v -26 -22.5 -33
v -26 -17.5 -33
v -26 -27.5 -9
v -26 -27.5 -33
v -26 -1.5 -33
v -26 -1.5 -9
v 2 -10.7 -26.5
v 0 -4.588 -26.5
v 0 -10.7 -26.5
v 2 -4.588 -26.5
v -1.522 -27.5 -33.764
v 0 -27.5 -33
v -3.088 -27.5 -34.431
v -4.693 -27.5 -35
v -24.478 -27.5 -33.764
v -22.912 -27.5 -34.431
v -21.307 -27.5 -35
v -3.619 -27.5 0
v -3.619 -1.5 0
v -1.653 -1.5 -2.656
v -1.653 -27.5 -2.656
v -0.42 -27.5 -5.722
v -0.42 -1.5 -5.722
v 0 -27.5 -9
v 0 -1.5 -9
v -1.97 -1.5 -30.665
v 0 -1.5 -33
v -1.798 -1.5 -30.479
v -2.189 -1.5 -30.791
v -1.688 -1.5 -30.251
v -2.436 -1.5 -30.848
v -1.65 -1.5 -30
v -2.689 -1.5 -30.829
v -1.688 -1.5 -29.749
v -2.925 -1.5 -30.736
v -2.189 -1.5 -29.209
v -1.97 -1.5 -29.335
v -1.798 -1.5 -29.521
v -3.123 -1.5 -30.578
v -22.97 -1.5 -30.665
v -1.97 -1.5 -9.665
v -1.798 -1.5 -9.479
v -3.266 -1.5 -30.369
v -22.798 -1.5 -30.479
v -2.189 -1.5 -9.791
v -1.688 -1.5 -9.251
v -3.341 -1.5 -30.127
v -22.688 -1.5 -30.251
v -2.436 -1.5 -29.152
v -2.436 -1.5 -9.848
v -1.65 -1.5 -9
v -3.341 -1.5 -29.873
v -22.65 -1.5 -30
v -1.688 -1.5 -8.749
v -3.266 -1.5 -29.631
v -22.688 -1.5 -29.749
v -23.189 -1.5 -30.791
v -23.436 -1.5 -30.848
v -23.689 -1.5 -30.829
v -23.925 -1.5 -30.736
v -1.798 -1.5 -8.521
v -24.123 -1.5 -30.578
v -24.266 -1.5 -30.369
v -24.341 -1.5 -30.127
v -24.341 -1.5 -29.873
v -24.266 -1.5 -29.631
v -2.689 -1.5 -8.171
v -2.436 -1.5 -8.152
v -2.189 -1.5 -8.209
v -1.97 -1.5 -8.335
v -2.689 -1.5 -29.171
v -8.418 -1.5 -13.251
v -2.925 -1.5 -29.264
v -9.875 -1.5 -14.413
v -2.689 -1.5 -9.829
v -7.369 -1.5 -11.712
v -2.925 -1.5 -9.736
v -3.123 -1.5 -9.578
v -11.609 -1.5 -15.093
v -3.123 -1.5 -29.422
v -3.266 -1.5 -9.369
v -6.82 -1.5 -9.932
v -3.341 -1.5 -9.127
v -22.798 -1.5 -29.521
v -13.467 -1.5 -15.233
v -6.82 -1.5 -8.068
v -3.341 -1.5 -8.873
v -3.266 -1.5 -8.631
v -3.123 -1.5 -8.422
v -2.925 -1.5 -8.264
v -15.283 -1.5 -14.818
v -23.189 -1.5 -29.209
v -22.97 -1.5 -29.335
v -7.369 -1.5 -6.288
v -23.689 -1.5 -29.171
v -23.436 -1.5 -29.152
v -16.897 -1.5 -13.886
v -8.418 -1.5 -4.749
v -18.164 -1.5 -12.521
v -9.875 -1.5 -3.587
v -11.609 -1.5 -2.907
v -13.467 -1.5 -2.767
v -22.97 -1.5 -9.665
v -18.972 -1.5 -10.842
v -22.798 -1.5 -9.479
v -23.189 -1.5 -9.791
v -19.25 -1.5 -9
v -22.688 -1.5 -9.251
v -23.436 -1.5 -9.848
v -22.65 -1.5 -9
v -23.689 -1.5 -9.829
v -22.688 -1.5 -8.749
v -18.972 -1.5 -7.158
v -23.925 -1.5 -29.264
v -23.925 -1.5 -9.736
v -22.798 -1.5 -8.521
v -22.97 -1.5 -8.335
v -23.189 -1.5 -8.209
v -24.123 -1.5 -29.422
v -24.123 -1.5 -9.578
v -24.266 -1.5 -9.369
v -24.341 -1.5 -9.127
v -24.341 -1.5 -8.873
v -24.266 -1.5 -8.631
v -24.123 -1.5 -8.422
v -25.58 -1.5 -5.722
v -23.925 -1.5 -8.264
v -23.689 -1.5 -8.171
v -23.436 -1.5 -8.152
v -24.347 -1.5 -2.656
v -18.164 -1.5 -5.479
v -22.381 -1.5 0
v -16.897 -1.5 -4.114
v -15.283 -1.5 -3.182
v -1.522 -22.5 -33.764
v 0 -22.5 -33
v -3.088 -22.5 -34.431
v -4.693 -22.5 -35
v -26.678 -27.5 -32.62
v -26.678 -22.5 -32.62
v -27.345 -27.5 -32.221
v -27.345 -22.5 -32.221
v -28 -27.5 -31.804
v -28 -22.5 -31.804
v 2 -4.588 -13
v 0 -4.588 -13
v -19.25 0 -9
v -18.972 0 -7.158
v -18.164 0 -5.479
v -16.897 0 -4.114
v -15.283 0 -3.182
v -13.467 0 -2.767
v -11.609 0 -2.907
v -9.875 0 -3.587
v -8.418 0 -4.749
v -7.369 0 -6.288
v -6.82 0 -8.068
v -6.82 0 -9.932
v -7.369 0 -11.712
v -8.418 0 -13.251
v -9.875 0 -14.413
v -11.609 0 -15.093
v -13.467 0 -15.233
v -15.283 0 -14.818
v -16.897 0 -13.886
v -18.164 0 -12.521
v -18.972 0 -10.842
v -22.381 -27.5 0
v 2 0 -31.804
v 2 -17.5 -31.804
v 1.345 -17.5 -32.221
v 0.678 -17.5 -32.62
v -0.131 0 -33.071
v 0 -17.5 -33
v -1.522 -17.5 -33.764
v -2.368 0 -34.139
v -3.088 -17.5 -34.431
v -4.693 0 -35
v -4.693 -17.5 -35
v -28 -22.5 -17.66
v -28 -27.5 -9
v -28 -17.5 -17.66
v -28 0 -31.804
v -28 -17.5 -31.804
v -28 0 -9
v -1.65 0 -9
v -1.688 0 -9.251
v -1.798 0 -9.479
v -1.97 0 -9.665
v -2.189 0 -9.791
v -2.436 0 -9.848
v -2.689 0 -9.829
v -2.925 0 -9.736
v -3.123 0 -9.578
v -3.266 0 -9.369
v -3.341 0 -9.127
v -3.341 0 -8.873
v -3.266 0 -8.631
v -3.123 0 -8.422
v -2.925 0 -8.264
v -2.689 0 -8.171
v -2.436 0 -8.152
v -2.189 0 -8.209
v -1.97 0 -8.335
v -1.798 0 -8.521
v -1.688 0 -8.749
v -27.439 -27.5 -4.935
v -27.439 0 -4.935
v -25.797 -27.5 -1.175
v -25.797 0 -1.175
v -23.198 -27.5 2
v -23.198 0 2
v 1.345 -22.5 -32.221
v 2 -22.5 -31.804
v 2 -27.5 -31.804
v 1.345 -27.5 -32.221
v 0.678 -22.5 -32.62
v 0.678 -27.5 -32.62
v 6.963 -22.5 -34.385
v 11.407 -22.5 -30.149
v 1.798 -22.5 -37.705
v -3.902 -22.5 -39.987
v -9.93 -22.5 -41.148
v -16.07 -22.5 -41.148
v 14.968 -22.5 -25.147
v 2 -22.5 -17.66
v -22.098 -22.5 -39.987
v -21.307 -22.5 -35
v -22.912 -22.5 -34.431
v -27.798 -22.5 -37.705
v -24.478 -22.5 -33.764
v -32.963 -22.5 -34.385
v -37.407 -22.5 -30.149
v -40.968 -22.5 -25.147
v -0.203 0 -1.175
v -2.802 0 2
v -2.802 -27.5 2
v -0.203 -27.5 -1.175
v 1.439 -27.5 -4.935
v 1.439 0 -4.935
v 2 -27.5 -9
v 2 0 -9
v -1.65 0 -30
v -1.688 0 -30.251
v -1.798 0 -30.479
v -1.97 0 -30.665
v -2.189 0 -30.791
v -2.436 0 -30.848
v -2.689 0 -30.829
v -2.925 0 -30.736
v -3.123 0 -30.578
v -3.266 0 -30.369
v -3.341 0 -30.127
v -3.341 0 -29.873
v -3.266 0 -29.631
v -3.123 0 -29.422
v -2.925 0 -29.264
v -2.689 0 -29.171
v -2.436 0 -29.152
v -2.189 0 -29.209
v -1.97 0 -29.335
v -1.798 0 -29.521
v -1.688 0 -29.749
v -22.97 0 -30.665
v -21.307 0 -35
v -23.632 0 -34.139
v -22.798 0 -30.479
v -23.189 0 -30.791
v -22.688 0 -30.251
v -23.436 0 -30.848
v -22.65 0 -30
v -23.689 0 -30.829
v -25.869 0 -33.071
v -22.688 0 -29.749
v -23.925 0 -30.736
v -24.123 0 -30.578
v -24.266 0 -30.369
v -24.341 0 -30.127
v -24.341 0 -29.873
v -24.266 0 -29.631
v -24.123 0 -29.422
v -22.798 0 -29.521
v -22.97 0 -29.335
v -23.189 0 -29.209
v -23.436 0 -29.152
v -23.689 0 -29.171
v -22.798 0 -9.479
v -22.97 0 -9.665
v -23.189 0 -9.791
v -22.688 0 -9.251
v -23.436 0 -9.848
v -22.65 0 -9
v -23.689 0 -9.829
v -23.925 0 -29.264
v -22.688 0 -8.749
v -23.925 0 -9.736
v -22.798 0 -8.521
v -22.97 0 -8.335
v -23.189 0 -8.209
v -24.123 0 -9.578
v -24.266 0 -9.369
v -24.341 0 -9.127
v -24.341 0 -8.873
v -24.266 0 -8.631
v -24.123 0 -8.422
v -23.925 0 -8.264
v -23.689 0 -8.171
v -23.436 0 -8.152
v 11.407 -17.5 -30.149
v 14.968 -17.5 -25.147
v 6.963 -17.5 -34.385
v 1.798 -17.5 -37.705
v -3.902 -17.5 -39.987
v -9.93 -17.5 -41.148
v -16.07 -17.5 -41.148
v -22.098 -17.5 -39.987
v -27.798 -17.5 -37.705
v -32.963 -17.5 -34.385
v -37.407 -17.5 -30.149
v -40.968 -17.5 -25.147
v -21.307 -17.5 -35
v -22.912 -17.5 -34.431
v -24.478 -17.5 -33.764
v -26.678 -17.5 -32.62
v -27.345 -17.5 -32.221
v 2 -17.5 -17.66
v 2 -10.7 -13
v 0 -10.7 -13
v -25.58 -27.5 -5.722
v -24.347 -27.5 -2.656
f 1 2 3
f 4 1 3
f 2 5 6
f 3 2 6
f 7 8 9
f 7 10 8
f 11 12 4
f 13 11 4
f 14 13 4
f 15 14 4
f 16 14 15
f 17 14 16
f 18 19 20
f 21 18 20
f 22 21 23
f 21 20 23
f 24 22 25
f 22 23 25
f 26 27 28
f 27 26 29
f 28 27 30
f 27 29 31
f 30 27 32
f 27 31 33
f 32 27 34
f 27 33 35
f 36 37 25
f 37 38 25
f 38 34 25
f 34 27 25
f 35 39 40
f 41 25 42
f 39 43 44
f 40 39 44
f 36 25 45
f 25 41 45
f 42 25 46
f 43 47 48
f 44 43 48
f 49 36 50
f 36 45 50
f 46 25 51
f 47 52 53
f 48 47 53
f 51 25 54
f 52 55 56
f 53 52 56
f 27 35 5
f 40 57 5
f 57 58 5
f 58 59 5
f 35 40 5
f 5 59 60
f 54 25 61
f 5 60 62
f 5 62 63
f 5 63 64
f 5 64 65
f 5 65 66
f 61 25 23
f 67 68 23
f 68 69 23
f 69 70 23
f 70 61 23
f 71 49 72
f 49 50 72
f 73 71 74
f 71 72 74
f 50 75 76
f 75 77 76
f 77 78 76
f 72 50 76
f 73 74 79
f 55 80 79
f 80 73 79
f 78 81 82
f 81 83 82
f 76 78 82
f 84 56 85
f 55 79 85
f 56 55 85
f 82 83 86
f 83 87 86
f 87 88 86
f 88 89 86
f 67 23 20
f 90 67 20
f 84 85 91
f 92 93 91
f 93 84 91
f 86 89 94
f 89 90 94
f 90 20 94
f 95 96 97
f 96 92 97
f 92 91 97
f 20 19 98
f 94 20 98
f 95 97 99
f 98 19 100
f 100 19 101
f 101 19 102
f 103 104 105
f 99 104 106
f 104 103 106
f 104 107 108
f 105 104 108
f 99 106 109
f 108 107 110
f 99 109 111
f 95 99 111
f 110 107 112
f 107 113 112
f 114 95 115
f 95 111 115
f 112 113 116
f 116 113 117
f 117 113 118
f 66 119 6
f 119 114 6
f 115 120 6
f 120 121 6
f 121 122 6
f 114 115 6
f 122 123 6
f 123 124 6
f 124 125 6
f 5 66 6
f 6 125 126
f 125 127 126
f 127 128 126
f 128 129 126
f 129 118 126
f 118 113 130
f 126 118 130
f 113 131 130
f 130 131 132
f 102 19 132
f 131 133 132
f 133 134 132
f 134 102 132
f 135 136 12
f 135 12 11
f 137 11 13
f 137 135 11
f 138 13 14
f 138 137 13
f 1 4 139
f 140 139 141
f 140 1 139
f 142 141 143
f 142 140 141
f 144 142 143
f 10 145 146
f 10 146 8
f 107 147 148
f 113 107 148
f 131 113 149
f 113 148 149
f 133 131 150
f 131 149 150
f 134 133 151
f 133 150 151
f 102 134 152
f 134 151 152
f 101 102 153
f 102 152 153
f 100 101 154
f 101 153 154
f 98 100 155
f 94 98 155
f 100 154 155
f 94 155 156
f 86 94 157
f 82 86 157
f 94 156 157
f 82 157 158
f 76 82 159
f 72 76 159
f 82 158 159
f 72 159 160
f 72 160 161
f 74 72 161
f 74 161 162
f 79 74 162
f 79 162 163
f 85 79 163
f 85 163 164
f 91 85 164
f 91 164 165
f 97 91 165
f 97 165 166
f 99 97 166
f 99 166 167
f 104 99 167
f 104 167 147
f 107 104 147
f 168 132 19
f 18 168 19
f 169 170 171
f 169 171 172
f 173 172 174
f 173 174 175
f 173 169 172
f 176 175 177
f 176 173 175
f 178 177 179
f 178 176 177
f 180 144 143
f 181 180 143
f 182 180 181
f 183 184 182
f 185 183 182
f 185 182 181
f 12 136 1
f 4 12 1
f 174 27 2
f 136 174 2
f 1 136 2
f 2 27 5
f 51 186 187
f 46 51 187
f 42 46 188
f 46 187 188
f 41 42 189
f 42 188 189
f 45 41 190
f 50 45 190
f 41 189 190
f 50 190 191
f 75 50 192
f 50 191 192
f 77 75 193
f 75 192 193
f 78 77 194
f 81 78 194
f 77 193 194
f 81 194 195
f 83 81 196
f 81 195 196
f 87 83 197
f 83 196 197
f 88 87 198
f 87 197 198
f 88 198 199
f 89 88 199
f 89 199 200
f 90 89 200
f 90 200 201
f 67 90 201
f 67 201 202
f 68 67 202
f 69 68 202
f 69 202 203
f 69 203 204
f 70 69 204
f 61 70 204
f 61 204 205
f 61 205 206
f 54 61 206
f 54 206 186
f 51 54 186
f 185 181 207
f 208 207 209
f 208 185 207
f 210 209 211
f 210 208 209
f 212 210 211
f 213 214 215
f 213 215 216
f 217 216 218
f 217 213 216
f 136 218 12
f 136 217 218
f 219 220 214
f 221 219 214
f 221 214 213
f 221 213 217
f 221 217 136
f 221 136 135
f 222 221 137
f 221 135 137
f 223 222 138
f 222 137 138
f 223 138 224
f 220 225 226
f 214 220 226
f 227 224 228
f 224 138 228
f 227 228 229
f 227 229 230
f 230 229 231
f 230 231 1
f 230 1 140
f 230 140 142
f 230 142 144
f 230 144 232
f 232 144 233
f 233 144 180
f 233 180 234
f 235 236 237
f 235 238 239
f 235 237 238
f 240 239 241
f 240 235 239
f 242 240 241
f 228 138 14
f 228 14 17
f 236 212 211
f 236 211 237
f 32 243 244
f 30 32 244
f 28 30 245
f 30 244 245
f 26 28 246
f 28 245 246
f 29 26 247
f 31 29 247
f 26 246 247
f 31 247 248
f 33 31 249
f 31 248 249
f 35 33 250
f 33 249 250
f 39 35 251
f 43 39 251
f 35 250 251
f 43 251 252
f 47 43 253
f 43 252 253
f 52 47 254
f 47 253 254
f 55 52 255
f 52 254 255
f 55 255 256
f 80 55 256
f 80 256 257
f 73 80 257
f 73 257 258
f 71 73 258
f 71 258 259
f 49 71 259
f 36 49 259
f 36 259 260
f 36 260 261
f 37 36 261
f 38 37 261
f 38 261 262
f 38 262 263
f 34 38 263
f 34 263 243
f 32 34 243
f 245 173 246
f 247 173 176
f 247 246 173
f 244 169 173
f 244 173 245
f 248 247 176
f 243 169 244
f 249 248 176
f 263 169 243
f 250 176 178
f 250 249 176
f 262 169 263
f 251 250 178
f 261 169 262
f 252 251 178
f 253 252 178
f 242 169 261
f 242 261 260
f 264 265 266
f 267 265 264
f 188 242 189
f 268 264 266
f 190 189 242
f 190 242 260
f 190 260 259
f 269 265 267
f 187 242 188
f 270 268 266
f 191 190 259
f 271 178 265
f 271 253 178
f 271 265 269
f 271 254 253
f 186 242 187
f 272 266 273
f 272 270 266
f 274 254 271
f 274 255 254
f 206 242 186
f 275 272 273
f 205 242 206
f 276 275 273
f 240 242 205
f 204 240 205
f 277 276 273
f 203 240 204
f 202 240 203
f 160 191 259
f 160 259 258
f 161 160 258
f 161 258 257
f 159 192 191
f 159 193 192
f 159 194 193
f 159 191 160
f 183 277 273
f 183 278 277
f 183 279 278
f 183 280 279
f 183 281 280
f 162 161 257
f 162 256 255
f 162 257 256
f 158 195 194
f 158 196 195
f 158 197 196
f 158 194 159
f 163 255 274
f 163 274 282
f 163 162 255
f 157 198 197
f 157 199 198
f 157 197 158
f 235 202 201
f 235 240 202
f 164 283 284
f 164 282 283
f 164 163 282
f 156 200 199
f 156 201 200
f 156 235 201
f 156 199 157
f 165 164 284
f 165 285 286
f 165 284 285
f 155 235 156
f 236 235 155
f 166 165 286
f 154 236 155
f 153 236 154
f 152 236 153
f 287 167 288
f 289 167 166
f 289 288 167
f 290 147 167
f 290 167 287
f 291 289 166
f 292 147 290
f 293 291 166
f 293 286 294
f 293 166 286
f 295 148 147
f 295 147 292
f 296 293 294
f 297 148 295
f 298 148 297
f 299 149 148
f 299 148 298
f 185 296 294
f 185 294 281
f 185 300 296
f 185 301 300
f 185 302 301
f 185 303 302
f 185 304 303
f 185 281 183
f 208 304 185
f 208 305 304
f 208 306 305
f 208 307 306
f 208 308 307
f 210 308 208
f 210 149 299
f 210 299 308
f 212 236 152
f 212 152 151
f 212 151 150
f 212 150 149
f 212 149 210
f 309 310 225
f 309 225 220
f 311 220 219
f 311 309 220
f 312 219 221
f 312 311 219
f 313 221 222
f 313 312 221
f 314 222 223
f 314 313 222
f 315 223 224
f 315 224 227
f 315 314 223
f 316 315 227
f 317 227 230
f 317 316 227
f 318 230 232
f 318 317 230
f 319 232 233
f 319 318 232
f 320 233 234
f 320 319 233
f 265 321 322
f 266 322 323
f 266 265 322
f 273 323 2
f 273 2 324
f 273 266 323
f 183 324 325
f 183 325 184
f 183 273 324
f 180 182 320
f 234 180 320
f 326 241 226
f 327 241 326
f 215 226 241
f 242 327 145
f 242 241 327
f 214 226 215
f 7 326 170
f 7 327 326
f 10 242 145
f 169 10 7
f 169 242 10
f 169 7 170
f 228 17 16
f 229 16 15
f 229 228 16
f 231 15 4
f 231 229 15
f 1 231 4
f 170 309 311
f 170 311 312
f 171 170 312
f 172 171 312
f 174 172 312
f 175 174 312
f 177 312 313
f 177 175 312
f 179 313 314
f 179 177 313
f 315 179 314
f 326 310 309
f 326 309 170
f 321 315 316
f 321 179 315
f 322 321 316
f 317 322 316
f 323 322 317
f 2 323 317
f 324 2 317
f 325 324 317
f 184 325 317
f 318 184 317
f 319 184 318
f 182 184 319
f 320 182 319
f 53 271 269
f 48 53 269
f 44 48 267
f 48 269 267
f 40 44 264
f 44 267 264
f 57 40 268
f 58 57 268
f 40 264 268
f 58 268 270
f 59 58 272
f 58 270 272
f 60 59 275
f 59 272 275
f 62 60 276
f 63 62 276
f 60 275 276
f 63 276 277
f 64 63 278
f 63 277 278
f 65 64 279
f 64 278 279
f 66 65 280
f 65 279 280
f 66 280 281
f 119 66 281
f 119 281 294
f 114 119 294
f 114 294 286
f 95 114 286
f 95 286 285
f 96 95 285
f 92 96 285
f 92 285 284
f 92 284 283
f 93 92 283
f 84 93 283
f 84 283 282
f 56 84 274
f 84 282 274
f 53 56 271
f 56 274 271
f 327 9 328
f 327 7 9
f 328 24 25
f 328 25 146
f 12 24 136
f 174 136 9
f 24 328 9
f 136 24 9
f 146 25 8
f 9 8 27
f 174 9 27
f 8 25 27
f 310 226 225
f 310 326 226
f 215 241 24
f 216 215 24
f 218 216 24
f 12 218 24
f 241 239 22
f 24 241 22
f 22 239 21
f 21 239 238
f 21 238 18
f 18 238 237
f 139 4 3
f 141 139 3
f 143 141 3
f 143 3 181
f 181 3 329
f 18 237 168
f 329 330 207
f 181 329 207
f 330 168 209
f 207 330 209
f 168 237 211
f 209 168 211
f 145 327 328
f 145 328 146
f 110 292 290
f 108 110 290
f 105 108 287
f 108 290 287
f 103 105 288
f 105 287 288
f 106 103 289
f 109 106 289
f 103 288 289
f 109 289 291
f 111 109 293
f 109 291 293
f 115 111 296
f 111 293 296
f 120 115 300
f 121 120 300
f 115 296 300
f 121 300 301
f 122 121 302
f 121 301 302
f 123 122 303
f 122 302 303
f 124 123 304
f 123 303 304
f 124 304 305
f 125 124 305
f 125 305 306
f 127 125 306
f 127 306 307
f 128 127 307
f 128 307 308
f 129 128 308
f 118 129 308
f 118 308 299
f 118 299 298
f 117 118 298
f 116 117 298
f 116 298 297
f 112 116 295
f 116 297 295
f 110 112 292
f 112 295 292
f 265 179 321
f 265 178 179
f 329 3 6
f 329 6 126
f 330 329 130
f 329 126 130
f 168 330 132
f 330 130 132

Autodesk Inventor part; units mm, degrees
ref_plane "YZ Plane" through (0, 0, 0) normal (1, 0, 0) x (0, 1, 0)
ref_plane "XZ Plane" through (0, 0, 0) normal (0, 1, 0) x (-1, 0, 0)
ref_plane "XY Plane" through (0, 0, 0) normal (0, 0, 1) x (1, 0, 0)
sketch "スケッチ1" plane through (0, 0, 0) normal (0, 1, 0) x (-1, 0, 0)
  line L0 (26, 0) -> (0, 0)
  line L1 (0, 0) -> (0, -33)
  line L2 (0, -33) -> (26, -33)
  line L3 (26, -33) -> (26, 0)
  line L4 (26, -9) -> (0, -9)
  line L5 (0, -9) -> (0, -33)
  line L6 (0, -33) -> (26, -33)
  line L7 (26, -33) -> (26, -9)
  circle A0 centre (13, -9) radius 13
  circle A1 centre (13, -9) radius 6.25
  circle A2 centre (13, -9) radius 27.2947
  circle A3 centre (13, -9) radius 32.2947
  circle A4 centre (13, -9) radius 15
  line L8 (28, -9) -> (-2, -9)
  line L9 (-2, -9) -> (-2, -35)
  line L10 (-2, -35) -> (28, -35)
  line L11 (28, -35) -> (28, -9)
  line L12 (23.198, 2) -> (2.802, 2)
  line L13 (13, -9) -> (40.968, -25.1473)
  line L14 (13, -9) -> (-14.968, -25.1473)
  point P0 (22.3808, 0)
  point P1 (3.6192, 0)
  point P2 (0, -9)
  point P3 (-17.3636, 2)
  point P4 (43.3636, 2)
  point P5 (25, 0)
  point P6 (26, -1.5167)
  point P7 (0, -1.5167)
  point P8 (1, 0)
  point P9 (21.3066, -35)
  point P10 (4.6934, -35)
  point P11 (0, -16.4833)
  point P12 (26, -16.4833)
  point P13 (0, -9)
  point P14 (26, -9)
  point P15 (28, -17.6603)
  point P16 (-2, -17.6603)
  point P17 (28, -31.8035)
  point P18 (-2, -31.8035)
  dimension "d0" = 26
  dimension "d1" = 33
  dimension "d2" = 24
  dimension "d3" = 12.5
  dimension "d6" = 5
  dimension "d7" = 2
  dimension "d8" = 2
  dimension "d9" = 2
  dimension "d16" = 60
  dimension "d17" = 60
extrude "押し出し1" add sketch "スケッチ1" against normal blind 1.5 contours A0 L4 A1 L0 | A0 L13 A1 L4 | L3 A4 L13 A0 | L3 L13 A4 | L13 A4 L14 A0 | A0 L14 A1 L13 | A0 L14 A4 L1 | L4 A1 L14 A0 | L3 L2 L1 L14 A4 L13 | A4 L14 L1
extrude "押し出し2" add sketch "スケッチ1" against normal blind 27.5 contours A4 L3 A0 L0 | L0 A0 L12 A4 | A4 L8 L3 | L0 A0 L12 | L8 A4 L3 | L11 L13 L3 A4 | A0 L1 A4 L0 | L0 A4 L12 A0 | L11 A2 L3 L13 | L8 A4 L1 | L1 A4 L8 | L1 L14 L9 A4 | A2 L10 L2 | L1 A2 L9 L14
extrude "押し出し3" add sketch "スケッチ1" against normal blind 22.5 contours L13 A2 L11 | L11 L10 A2 | A2 L13 A3 L14 L9 L10 L11 | L9 A2 L14 | A2 L10 L9 | A2 L10
extrude "押し出し4" cut sketch "スケッチ1" against normal blind 17.5 contours L13 A2 L11 | L11 L10 A2 | A2 L13 A3 L14 L9 L10 L11 | L9 A2 L14 | A2 L10 L9 | A2 L10
sketch "スケッチ2" plane through (2, -27.5, -9) normal (1, 0, 0) x (0, 0, -1)
  line L0 (17.5, 16.8) -> (4, 16.8) projected
  line L1 (4, 16.8) -> (4, 18.5) projected
  line L2 (4, 18.5) -> (0, 18.5) projected
  line L3 (0, 12.5) -> (0, 18.5) projected
  line L4 (0, 12.5) -> (21, 12.5) projected
  line L5 (21, 12.5) -> (21, 18.5) projected
  line L6 (21, 18.5) -> (17.5, 18.5) projected
  line L7 (17.5, 18.5) -> (17.5, 16.8) projected
  line L8 (4, 22.9122) -> (17.5, 22.9122) projected
  line L9 (17.5, 22.9122) -> (17.5, 19) projected
  line L10 (17.5, 19) -> (21, 19) projected
  line L11 (21, 19) -> (21, 26) projected
  line L12 (21, 26) -> (0, 26) projected
  line L13 (0, 19) -> (0, 26) projected
  line L14 (0, 19) -> (4, 19) projected
  line L15 (4, 19) -> (4, 22.9122) projected
  line L16 (4, 16.8) -> (17.5, 16.8)
  line L17 (17.5, 16.8) -> (17.5, 22.9122)
  line L18 (17.5, 22.9122) -> (4, 22.9122)
  line L19 (4, 22.9122) -> (4, 16.8)
  point P0 (-9, 27.5)
  point P1 (4, 19)
  point P2 (4, 18.5)
extrude "押し出し5" cut sketch "スケッチ2" against normal up to surface (2 mm away) contours L0 L1 L19 L15 L8 L9 L17 L7
sketch "スケッチ3" plane through (0, 0, 0) normal (0, 1, 0) x (1, 0, 0)
  circle A0 centre (-2.5, 30) radius 0.85 projected
  circle A1 centre (-23.5, 30) radius 0.85 projected
  circle A2 centre (-23.5, 9) radius 0.85 projected
  circle A3 centre (-2.5, 9) radius 0.85 projected
  point P0 (0, 0)
extrude "押し出し6" cut sketch "スケッチ3" against normal blind 10
equation "\"d17\" = d16"
properties part number "waist"
